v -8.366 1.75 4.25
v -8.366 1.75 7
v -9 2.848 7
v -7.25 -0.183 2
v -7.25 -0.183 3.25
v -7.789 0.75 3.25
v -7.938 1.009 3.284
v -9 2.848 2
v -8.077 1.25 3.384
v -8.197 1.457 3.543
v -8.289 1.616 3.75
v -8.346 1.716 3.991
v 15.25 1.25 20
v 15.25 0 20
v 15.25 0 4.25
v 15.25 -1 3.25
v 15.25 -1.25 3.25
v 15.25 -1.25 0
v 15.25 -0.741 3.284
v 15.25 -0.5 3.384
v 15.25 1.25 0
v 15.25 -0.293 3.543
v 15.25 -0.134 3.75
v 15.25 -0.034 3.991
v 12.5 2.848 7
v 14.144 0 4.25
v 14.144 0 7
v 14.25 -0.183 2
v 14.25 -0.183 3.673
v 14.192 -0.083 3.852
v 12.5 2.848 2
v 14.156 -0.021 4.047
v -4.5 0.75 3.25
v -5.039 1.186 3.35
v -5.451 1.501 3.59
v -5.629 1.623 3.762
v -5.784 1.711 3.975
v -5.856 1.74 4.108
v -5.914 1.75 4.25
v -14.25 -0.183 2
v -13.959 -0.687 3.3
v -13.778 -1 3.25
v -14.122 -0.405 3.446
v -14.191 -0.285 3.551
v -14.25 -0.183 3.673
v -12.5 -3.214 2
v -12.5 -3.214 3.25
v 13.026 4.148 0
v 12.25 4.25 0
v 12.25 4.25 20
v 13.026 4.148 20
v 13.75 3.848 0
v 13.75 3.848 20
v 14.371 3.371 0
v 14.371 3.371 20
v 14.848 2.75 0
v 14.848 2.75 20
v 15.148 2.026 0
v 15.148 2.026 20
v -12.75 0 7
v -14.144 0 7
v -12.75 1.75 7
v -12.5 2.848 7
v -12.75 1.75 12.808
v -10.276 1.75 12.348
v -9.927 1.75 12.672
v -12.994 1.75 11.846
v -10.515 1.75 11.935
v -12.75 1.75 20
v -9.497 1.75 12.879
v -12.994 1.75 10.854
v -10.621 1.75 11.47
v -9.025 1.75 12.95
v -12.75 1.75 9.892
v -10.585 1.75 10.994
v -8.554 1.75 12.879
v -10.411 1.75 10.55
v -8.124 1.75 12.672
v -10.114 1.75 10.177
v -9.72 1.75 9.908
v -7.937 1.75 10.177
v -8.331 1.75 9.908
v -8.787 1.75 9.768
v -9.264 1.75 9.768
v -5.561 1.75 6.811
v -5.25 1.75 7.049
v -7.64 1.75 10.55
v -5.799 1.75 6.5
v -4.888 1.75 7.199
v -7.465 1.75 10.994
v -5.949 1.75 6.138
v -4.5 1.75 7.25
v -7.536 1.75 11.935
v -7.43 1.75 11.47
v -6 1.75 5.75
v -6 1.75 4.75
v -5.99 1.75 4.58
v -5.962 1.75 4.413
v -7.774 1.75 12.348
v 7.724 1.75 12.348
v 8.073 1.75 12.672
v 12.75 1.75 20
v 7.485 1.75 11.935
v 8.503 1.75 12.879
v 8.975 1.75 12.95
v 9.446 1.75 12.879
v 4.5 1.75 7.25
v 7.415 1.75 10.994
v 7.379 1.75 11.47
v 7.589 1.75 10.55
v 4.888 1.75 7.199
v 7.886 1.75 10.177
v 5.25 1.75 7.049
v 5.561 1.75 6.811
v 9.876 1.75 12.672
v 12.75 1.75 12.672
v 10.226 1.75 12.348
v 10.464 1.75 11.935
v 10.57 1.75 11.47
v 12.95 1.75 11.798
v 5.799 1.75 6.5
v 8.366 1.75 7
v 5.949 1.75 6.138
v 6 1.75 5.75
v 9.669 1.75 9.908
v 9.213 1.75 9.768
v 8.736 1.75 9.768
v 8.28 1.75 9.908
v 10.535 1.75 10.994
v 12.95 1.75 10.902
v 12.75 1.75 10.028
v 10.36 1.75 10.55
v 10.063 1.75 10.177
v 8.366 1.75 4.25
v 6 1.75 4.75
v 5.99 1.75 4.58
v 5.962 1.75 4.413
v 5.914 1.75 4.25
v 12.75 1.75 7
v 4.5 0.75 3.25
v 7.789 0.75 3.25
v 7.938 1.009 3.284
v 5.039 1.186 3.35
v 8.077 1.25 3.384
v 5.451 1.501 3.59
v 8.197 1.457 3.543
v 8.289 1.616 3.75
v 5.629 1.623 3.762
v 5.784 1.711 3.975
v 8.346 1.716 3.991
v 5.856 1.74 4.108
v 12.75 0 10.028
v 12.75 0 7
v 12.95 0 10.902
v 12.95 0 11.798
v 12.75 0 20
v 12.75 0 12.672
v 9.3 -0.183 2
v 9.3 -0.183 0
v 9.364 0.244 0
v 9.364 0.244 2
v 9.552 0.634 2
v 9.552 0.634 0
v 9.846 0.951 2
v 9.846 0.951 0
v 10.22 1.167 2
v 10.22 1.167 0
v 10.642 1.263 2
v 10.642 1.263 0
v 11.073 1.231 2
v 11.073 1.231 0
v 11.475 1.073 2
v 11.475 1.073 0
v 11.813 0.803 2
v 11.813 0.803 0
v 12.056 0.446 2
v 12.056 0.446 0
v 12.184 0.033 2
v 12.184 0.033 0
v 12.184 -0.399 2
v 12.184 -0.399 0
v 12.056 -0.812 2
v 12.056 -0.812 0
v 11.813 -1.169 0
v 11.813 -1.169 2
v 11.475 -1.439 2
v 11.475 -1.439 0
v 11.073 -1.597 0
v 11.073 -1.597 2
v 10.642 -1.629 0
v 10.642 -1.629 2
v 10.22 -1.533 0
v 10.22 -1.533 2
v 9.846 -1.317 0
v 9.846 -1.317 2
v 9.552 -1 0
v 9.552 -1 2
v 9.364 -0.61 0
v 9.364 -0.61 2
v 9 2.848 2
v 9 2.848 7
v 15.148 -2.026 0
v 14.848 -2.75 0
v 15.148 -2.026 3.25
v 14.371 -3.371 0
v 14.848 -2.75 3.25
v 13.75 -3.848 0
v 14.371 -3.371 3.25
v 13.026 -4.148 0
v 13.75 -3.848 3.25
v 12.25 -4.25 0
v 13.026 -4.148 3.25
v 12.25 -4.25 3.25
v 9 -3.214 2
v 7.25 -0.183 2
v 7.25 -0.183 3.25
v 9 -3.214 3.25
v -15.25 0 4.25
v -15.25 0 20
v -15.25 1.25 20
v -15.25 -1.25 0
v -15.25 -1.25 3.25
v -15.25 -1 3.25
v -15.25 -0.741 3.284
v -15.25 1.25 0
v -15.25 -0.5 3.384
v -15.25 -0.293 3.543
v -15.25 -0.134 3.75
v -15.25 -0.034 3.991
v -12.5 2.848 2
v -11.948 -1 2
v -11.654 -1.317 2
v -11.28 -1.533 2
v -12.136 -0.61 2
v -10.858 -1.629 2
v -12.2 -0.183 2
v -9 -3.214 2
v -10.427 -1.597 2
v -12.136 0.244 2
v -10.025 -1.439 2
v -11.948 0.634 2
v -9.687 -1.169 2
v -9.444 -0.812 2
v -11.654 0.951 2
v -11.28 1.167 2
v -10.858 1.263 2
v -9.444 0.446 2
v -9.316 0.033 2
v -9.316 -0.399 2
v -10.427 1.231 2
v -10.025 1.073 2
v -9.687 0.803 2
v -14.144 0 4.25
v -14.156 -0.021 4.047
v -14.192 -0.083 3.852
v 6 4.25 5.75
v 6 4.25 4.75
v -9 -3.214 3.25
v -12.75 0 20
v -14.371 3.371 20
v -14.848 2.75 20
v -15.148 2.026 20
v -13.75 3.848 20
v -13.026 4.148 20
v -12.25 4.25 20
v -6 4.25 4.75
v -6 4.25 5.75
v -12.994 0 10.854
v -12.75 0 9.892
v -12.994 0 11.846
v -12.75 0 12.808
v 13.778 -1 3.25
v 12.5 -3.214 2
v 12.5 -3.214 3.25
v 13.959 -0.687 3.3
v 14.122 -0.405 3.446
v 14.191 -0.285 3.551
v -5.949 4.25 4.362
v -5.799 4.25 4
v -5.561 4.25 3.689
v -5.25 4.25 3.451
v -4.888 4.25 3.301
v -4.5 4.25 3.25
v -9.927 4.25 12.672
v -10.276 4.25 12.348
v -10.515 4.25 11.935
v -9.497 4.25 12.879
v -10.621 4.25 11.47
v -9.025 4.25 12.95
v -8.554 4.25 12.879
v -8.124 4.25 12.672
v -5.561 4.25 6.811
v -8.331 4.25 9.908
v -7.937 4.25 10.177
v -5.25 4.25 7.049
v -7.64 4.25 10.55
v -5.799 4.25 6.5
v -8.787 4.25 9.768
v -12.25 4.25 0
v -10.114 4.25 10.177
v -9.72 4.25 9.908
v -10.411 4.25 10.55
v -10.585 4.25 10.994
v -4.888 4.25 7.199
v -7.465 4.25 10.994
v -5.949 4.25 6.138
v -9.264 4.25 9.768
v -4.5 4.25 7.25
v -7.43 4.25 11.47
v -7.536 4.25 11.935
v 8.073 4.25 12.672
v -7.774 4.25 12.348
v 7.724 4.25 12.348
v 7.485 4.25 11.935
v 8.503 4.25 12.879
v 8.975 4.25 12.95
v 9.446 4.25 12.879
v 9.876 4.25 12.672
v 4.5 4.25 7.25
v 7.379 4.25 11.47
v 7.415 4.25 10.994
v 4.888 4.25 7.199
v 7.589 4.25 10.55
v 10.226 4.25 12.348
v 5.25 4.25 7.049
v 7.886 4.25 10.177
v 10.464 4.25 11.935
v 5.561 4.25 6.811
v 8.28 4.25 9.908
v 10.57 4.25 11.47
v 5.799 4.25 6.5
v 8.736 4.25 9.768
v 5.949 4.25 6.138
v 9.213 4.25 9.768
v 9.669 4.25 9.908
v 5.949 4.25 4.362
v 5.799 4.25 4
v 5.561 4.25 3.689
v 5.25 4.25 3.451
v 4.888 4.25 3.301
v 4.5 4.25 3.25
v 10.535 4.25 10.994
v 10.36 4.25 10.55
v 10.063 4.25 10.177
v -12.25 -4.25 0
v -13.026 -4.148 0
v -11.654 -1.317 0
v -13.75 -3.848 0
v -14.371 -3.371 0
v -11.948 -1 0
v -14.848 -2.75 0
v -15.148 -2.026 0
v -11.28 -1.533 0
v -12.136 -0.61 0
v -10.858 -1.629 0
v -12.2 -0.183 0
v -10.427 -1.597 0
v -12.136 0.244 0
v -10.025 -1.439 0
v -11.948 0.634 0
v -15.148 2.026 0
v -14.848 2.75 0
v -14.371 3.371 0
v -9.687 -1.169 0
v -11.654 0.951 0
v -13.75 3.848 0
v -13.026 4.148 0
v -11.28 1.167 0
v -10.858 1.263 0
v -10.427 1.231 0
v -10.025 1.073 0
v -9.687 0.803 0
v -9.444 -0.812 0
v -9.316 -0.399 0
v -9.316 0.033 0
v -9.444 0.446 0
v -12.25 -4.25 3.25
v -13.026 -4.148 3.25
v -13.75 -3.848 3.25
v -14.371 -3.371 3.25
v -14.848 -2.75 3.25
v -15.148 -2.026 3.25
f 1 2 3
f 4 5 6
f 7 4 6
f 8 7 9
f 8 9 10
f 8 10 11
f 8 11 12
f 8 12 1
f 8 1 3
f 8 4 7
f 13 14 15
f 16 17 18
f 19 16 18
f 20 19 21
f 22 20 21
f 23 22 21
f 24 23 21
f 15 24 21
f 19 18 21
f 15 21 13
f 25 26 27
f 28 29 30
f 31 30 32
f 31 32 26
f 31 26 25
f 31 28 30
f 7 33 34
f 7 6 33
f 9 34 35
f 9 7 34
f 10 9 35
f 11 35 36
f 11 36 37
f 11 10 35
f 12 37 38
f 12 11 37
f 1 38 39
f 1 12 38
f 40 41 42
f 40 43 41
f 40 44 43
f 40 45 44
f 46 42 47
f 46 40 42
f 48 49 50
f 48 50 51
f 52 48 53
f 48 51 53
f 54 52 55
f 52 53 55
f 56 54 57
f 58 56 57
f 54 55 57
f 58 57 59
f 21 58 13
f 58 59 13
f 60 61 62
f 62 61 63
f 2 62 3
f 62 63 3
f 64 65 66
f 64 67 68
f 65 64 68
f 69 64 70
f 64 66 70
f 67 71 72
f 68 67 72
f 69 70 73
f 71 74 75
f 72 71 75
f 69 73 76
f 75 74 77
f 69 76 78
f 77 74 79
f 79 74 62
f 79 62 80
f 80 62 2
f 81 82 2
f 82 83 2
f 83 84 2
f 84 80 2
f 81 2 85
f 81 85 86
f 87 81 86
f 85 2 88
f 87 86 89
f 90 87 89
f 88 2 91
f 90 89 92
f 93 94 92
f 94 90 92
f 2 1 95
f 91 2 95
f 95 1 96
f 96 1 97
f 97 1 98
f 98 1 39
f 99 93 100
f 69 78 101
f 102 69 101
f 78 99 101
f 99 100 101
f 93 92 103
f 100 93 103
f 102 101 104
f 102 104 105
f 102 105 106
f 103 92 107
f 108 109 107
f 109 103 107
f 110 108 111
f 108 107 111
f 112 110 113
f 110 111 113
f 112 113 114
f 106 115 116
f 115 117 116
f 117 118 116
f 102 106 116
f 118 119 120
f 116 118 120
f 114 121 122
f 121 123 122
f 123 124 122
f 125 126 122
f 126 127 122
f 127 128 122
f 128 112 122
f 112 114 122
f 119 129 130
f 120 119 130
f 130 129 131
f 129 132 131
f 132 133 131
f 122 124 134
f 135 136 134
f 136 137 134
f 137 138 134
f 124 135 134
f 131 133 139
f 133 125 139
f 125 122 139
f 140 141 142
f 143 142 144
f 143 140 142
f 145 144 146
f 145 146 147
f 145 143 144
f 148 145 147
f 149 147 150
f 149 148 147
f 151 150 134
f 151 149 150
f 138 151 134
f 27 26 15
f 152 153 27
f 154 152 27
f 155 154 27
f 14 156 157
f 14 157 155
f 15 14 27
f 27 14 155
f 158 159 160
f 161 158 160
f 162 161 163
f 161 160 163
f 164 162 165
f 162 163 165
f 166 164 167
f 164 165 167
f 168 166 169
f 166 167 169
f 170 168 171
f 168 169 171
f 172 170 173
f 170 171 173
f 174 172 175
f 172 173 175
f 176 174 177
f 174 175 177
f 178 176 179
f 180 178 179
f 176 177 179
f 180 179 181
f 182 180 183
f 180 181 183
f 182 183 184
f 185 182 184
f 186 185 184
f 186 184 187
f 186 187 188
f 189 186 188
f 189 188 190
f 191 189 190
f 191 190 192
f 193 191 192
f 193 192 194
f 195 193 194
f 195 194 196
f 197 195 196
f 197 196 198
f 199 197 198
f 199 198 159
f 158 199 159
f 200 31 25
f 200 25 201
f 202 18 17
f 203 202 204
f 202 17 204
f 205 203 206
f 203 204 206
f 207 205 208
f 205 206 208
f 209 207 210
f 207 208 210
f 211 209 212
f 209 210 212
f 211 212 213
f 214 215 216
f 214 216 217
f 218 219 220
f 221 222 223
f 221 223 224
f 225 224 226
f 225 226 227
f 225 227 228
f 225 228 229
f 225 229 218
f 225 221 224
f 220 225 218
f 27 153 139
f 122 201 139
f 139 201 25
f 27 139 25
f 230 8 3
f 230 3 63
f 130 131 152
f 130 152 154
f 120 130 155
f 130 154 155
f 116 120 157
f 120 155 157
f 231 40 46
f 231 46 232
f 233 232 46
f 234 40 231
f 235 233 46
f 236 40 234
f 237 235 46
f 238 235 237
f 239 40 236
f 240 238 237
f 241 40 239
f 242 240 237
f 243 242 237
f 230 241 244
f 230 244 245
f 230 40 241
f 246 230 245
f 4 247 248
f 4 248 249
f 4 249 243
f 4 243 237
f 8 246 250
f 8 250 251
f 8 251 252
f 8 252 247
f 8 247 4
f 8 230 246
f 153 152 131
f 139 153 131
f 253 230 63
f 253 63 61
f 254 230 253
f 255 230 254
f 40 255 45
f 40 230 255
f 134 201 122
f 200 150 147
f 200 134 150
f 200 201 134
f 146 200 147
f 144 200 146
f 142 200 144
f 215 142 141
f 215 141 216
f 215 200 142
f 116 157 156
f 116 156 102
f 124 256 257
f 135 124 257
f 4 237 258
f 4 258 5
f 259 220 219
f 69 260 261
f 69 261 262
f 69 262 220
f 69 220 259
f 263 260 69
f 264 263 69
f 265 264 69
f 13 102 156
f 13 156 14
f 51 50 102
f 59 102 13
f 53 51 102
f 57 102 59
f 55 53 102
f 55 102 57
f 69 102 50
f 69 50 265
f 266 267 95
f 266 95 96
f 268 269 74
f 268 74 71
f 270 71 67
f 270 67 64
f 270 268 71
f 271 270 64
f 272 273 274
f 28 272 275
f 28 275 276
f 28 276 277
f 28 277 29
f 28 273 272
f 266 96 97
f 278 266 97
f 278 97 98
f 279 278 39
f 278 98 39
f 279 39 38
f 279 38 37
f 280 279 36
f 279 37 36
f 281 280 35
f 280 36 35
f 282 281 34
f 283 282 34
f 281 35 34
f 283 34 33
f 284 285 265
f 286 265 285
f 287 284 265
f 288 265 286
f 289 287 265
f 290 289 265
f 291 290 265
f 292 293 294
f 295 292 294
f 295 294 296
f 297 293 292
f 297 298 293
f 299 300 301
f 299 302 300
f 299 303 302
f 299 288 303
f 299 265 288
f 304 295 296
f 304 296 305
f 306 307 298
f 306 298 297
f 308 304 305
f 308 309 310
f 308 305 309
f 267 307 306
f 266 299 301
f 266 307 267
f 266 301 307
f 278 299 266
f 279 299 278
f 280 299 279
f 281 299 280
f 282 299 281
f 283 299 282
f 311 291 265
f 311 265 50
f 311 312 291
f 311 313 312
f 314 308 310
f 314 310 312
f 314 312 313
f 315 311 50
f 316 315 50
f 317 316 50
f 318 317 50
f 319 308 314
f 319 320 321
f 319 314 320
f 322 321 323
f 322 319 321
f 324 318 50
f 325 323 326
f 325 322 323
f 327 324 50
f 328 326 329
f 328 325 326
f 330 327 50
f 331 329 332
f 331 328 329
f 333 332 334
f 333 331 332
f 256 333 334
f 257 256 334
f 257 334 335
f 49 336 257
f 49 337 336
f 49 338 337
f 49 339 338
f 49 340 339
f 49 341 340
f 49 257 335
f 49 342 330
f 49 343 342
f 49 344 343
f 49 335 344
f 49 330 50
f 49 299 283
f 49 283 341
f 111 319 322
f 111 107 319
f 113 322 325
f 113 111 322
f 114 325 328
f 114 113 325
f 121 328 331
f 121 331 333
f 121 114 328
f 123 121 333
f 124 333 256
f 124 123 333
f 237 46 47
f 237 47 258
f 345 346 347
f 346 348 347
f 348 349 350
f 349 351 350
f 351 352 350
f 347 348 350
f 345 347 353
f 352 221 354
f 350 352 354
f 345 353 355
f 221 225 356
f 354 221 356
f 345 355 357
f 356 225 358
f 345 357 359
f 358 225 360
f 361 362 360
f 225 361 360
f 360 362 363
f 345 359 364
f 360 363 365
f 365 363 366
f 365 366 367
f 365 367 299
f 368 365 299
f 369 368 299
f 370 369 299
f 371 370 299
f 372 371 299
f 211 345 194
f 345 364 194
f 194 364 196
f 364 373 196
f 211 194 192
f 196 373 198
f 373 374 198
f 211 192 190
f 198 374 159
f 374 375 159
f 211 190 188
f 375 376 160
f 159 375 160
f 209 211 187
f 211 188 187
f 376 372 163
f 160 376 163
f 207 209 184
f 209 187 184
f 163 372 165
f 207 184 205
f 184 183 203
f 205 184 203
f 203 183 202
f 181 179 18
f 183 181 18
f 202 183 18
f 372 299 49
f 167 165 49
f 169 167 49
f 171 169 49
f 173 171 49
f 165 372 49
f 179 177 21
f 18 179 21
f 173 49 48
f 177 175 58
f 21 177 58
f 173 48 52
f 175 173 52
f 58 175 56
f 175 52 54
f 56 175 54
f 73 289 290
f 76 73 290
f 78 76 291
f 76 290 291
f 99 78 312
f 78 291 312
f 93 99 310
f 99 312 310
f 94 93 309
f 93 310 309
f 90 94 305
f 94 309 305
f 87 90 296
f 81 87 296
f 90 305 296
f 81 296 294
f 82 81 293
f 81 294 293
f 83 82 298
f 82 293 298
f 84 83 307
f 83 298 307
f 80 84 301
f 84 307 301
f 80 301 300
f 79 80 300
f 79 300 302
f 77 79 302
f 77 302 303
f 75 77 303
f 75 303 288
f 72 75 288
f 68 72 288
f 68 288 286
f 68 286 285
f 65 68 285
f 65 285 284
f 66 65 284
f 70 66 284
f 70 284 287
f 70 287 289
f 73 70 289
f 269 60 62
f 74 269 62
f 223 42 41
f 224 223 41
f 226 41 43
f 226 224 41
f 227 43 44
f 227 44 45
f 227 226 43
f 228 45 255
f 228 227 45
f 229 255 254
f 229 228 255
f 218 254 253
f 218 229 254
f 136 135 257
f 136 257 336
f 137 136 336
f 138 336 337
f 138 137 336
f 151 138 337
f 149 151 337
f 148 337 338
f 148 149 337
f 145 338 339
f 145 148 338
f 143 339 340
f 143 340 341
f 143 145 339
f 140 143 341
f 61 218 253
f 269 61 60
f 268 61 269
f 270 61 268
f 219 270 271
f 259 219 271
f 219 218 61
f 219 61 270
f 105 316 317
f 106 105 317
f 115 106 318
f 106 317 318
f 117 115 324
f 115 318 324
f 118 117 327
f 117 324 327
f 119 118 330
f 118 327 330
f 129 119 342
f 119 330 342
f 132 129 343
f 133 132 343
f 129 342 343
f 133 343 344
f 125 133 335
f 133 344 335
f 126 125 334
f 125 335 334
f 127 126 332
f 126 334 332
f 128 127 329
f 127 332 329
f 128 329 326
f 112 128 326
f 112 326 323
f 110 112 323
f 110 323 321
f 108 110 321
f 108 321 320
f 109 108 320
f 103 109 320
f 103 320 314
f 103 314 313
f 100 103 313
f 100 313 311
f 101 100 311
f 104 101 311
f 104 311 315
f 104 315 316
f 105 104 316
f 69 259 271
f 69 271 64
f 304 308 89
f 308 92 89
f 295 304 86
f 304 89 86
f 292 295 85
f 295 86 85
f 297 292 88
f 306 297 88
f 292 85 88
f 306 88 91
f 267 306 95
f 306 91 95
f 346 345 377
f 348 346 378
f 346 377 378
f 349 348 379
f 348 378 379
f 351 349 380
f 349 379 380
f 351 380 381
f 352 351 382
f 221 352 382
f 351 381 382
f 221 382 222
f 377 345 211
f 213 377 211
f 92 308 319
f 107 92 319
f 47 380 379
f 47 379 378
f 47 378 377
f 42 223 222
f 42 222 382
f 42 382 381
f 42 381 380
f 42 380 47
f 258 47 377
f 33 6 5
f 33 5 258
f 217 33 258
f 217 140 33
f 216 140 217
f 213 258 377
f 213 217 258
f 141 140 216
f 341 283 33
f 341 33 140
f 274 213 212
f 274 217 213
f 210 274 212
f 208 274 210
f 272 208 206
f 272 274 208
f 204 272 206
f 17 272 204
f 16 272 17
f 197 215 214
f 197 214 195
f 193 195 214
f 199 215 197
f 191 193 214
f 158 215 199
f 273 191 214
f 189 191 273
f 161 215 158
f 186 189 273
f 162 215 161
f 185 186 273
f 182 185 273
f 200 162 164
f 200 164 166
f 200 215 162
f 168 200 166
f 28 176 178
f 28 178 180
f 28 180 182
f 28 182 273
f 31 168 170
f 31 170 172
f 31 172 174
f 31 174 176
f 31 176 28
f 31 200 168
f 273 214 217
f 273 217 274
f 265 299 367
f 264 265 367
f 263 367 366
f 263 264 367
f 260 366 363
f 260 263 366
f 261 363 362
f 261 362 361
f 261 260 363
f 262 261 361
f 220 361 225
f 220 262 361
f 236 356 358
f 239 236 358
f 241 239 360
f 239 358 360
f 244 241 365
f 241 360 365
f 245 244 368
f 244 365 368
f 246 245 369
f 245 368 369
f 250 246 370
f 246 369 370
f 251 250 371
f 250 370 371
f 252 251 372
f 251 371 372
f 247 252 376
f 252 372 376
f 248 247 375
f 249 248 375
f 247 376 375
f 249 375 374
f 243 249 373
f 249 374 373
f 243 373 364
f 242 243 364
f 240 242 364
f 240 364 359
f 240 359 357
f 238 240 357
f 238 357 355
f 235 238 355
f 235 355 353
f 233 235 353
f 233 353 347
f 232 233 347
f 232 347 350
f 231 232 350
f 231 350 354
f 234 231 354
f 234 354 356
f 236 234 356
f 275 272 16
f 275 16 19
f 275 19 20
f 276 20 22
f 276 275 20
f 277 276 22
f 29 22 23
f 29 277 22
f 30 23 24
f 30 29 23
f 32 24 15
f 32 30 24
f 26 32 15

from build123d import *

# Parameters (mm, degrees)
SKETCH1_W           = 30.5
SKETCH1_H           = 8.5
BOSS_EXTRUDE1_DEPTH = 20
SHELL1_T            = -2.5
SKETCH2_W           = 12
SKETCH2_H           = 16
CUT_EXTRUDE2_DEPTH  = 3
SKETCH3_W           = 12
SKETCH3_H           = 4
CUT_EXTRUDE3_DEPTH  = 4
SKETCH4_R           = 1.6
CUT_EXTRUDE4_DEPTH  = 10
FILLET1_R           = 3
FILLET2_R           = 3
FILLET3_R           = 3
FILLET4_R           = 3
SKETCH5_R           = 1.45
CUT_EXTRUDE5_DEPTH  = 29
SKETCH12_W          = 25.5
SKETCH12_H          = 3.5
BOSS_EXTRUDE3_DEPTH = 0.75
SKETCH13_R          = 1.462025065
SKETCH13_R_2        = 1.459070956
CUT_EXTRUDE6_DEPTH  = 2
CUT_EXTRUDE7_START  = -2
CUT_EXTRUDE7_DEPTH  = 5
FILLET5_R           = 1.5
FILLET6_R           = 1.5
FILLET7_R           = 1.5
FILLET8_R           = 1.5
FILLET9_R           = 1
FILLET10_R          = 1
CUT_EXTRUDE8_REACH  = 27.507
SKETCH15_W          = 30.5
SKETCH15_H          = 4.25
FILLET13_R          = 1
FILLET14_R          = 1
FILLET15_R          = 1
CUT_EXTRUDE9_DEPTH  = 1.75


with BuildPart() as part:
    # Sketch1 → Boss-Extrude1 (new body)
    with BuildSketch(Plane.XY):
        Rectangle(SKETCH1_W, SKETCH1_H)
    extrude(amount=BOSS_EXTRUDE1_DEPTH)

    # Shell1
    shell1_openings = [part.faces().sort_by_distance(p)[0] for p in [
        (0, 0, 20),
    ]]
    offset(amount=SHELL1_T, openings=shell1_openings, kind=Kind.INTERSECTION)

    # Sketch2 → Cut-Extrude2 (cut)
    with BuildSketch(Plane.XZ.offset(4.25)):
        with Locations((0, 12)):
            Rectangle(SKETCH2_W, SKETCH2_H)
    extrude(amount=-CUT_EXTRUDE2_DEPTH, mode=Mode.SUBTRACT)

    # Sketch3 → Cut-Extrude3 (cut)
    with BuildSketch(Plane(origin=(0, 4.25, 0), x_dir=(1, 0, 0), z_dir=(0, 1, 0))):
        with Locations((0, -5.25)):
            Rectangle(SKETCH3_W, SKETCH3_H)
    extrude(amount=-CUT_EXTRUDE3_DEPTH, mode=Mode.SUBTRACT)

    # Sketch4 → Cut-Extrude4 (cut)
    with BuildSketch(Plane(origin=(0, 4.25, 0), x_dir=(1, 0, 0), z_dir=(0, 1, 0))):
        with Locations(Location((8.9747, -11.35, 0), (0, 0, 270))):
            Circle(SKETCH4_R)
        with Locations(Location((-9.0253, -11.35, 0), (0, 0, 270))):
            Circle(SKETCH4_R)
    extrude(amount=-CUT_EXTRUDE4_DEPTH, mode=Mode.SUBTRACT)

    # Fillet1
    fillet1_edges = [part.edges().sort_by_distance(p)[0] for p in [
        (15.25, 4.25, 10),
    ]]
    fillet(fillet1_edges, radius=FILLET1_R)

    # Fillet2
    fillet2_edges = [part.edges().sort_by_distance(p)[0] for p in [
        (-15.25, 4.25, 10),
    ]]
    fillet(fillet2_edges, radius=FILLET2_R)

    # Fillet3
    fillet3_edges = [part.edges().sort_by_distance(p)[0] for p in [
        (15.25, -4.25, 10),
    ]]
    fillet(fillet3_edges, radius=FILLET3_R)

    # Fillet4
    fillet4_edges = [part.edges().sort_by_distance(p)[0] for p in [
        (-15.25, -4.25, 10),
    ]]
    fillet(fillet4_edges, radius=FILLET4_R)

    # Sketch5 → Cut-Extrude5 (cut)
    with BuildSketch(Plane(origin=(0, 0, 0), x_dir=(-1, 0, 0), z_dir=(0, 0, -1))):
        with Locations((-10.75, -0.182916649)):
            Circle(SKETCH5_R)
        with Locations((10.75, -0.182916649)):
            Circle(SKETCH5_R)
    extrude(amount=-CUT_EXTRUDE5_DEPTH, mode=Mode.SUBTRACT)

    # Sketch12 → Boss-Extrude3 (add)
    with BuildSketch(Plane.XY.offset(2.5)):
        Rectangle(SKETCH12_W, SKETCH12_H)
    extrude(amount=BOSS_EXTRUDE3_DEPTH)

    # Sketch13 → Cut-Extrude6 (cut)
    with BuildSketch(Plane.XY.offset(4)):
        with Locations((-10.75, -0.182916649)):
            Circle(SKETCH13_R)
        with Locations((10.75, -0.182916649)):
            Circle(SKETCH13_R_2)
    extrude(amount=-CUT_EXTRUDE6_DEPTH, mode=Mode.SUBTRACT)

    # Sketch14 → Cut-Extrude7 (cut)
    with BuildSketch(Plane.XY.offset(4).offset(CUT_EXTRUDE7_START)):
        Polygon((-7.25, -0.182916649), (-9, 2.848172265), (-12.5, 2.848172265), (-14.25, -0.182916649), (-12.5, -3.214005562), (-9, -3.214005562), align=None)
        Polygon((14.25, -0.182916649), (12.5, 2.848172265), (9, 2.848172265), (7.25, -0.182916649), (9, -3.214005562), (12.5, -3.214005562), align=None)
    extrude(amount=CUT_EXTRUDE7_DEPTH, mode=Mode.SUBTRACT)

    # Fillet5
    fillet5_edges = [part.edges().sort_by_distance(p)[0] for p in [
        (6, 3, 7.25),
    ]]
    fillet(fillet5_edges, radius=FILLET5_R)

    # Fillet6
    fillet6_edges = [part.edges().sort_by_distance(p)[0] for p in [
        (-6, 3, 7.25),
    ]]
    fillet(fillet6_edges, radius=FILLET6_R)

    # Fillet7
    fillet7_edges = [part.edges().sort_by_distance(p)[0] for p in [
        (-6, 3, 3.25),
    ]]
    fillet(fillet7_edges, radius=FILLET7_R)

    # Fillet8
    fillet8_edges = [part.edges().sort_by_distance(p)[0] for p in [
        (6, 3, 3.25),
    ]]
    fillet(fillet8_edges, radius=FILLET8_R)

    # Fillet9
    fillet9_edges = [part.edges().sort_by_distance(p)[0] for p in [
        (6, -3, 4),
    ]]
    fillet(fillet9_edges, radius=FILLET9_R)

    # Fillet10
    fillet10_edges = [part.edges().sort_by_distance(p)[0] for p in [
        (-6, -3, 4),
    ]]
    fillet(fillet10_edges, radius=FILLET10_R)

    # Cut-Extrude8: up to this face of the body (flat: up to its plane)
    cut_extrude8_end = Plane(part.part.faces().sort_by_distance((0, 0.887010367, 3.25))[0])
    # Sketch15 → Cut-Extrude8 (cut, up to the picked face)
    with BuildSketch(Plane.XY.offset(20), mode=Mode.PRIVATE) as cut_extrude8_sk1:
        with Locations((0, -2.125)):
            Rectangle(SKETCH15_W, SKETCH15_H)
    cut_extrude8_tool1 = split(extrude(cut_extrude8_sk1.sketch, amount=-CUT_EXTRUDE8_REACH, mode=Mode.PRIVATE), bisect_by=cut_extrude8_end, keep=Keep.BOTH, mode=Mode.PRIVATE)
    add(cut_extrude8_tool1.solids().sort_by(Axis((0, -2.125, 20), (0, 0, -1)))[0], mode=Mode.SUBTRACT)

    # Fillet13
    fillet13_edges = [part.edges().sort_by_distance(p)[0] for p in [
        (14.697196512, 0, 3.25),
    ]]
    fillet(fillet13_edges, radius=FILLET13_R)

    # Fillet14
    fillet14_edges = [part.edges().sort_by_distance(p)[0] for p in [
        (-14.697196512, 0, 3.25),
    ]]
    fillet(fillet14_edges, radius=FILLET14_R)

    # Fillet15
    fillet15_edges = [part.edges().sort_by_distance(p)[0] for p in [
        (-6.432984974, 1.75, 3.25),
        (6.432984974, 1.75, 3.25),
    ]]
    fillet(fillet15_edges, radius=FILLET15_R)

    # Sketch16 → Cut-Extrude9 (cut)
    with BuildSketch(Plane.XZ):
        with BuildLine():
            Line((-10.06119106, 15.213538496), (-10.061191059, 7.486461504))
            ThreePointArc((-10.061191059, 7.486461504), (-13.0253, 11.35), (-10.06119106, 15.213538496))
        make_face()
        with BuildLine():
            Line((10.01059106, 15.213538496), (10.010591059, 7.486461504))
            ThreePointArc((10.010591059, 7.486461504), (12.9747, 11.35), (10.01059106, 15.213538496))
        make_face()
    extrude(amount=-CUT_EXTRUDE9_DEPTH, mode=Mode.SUBTRACT)


solid = part.part
